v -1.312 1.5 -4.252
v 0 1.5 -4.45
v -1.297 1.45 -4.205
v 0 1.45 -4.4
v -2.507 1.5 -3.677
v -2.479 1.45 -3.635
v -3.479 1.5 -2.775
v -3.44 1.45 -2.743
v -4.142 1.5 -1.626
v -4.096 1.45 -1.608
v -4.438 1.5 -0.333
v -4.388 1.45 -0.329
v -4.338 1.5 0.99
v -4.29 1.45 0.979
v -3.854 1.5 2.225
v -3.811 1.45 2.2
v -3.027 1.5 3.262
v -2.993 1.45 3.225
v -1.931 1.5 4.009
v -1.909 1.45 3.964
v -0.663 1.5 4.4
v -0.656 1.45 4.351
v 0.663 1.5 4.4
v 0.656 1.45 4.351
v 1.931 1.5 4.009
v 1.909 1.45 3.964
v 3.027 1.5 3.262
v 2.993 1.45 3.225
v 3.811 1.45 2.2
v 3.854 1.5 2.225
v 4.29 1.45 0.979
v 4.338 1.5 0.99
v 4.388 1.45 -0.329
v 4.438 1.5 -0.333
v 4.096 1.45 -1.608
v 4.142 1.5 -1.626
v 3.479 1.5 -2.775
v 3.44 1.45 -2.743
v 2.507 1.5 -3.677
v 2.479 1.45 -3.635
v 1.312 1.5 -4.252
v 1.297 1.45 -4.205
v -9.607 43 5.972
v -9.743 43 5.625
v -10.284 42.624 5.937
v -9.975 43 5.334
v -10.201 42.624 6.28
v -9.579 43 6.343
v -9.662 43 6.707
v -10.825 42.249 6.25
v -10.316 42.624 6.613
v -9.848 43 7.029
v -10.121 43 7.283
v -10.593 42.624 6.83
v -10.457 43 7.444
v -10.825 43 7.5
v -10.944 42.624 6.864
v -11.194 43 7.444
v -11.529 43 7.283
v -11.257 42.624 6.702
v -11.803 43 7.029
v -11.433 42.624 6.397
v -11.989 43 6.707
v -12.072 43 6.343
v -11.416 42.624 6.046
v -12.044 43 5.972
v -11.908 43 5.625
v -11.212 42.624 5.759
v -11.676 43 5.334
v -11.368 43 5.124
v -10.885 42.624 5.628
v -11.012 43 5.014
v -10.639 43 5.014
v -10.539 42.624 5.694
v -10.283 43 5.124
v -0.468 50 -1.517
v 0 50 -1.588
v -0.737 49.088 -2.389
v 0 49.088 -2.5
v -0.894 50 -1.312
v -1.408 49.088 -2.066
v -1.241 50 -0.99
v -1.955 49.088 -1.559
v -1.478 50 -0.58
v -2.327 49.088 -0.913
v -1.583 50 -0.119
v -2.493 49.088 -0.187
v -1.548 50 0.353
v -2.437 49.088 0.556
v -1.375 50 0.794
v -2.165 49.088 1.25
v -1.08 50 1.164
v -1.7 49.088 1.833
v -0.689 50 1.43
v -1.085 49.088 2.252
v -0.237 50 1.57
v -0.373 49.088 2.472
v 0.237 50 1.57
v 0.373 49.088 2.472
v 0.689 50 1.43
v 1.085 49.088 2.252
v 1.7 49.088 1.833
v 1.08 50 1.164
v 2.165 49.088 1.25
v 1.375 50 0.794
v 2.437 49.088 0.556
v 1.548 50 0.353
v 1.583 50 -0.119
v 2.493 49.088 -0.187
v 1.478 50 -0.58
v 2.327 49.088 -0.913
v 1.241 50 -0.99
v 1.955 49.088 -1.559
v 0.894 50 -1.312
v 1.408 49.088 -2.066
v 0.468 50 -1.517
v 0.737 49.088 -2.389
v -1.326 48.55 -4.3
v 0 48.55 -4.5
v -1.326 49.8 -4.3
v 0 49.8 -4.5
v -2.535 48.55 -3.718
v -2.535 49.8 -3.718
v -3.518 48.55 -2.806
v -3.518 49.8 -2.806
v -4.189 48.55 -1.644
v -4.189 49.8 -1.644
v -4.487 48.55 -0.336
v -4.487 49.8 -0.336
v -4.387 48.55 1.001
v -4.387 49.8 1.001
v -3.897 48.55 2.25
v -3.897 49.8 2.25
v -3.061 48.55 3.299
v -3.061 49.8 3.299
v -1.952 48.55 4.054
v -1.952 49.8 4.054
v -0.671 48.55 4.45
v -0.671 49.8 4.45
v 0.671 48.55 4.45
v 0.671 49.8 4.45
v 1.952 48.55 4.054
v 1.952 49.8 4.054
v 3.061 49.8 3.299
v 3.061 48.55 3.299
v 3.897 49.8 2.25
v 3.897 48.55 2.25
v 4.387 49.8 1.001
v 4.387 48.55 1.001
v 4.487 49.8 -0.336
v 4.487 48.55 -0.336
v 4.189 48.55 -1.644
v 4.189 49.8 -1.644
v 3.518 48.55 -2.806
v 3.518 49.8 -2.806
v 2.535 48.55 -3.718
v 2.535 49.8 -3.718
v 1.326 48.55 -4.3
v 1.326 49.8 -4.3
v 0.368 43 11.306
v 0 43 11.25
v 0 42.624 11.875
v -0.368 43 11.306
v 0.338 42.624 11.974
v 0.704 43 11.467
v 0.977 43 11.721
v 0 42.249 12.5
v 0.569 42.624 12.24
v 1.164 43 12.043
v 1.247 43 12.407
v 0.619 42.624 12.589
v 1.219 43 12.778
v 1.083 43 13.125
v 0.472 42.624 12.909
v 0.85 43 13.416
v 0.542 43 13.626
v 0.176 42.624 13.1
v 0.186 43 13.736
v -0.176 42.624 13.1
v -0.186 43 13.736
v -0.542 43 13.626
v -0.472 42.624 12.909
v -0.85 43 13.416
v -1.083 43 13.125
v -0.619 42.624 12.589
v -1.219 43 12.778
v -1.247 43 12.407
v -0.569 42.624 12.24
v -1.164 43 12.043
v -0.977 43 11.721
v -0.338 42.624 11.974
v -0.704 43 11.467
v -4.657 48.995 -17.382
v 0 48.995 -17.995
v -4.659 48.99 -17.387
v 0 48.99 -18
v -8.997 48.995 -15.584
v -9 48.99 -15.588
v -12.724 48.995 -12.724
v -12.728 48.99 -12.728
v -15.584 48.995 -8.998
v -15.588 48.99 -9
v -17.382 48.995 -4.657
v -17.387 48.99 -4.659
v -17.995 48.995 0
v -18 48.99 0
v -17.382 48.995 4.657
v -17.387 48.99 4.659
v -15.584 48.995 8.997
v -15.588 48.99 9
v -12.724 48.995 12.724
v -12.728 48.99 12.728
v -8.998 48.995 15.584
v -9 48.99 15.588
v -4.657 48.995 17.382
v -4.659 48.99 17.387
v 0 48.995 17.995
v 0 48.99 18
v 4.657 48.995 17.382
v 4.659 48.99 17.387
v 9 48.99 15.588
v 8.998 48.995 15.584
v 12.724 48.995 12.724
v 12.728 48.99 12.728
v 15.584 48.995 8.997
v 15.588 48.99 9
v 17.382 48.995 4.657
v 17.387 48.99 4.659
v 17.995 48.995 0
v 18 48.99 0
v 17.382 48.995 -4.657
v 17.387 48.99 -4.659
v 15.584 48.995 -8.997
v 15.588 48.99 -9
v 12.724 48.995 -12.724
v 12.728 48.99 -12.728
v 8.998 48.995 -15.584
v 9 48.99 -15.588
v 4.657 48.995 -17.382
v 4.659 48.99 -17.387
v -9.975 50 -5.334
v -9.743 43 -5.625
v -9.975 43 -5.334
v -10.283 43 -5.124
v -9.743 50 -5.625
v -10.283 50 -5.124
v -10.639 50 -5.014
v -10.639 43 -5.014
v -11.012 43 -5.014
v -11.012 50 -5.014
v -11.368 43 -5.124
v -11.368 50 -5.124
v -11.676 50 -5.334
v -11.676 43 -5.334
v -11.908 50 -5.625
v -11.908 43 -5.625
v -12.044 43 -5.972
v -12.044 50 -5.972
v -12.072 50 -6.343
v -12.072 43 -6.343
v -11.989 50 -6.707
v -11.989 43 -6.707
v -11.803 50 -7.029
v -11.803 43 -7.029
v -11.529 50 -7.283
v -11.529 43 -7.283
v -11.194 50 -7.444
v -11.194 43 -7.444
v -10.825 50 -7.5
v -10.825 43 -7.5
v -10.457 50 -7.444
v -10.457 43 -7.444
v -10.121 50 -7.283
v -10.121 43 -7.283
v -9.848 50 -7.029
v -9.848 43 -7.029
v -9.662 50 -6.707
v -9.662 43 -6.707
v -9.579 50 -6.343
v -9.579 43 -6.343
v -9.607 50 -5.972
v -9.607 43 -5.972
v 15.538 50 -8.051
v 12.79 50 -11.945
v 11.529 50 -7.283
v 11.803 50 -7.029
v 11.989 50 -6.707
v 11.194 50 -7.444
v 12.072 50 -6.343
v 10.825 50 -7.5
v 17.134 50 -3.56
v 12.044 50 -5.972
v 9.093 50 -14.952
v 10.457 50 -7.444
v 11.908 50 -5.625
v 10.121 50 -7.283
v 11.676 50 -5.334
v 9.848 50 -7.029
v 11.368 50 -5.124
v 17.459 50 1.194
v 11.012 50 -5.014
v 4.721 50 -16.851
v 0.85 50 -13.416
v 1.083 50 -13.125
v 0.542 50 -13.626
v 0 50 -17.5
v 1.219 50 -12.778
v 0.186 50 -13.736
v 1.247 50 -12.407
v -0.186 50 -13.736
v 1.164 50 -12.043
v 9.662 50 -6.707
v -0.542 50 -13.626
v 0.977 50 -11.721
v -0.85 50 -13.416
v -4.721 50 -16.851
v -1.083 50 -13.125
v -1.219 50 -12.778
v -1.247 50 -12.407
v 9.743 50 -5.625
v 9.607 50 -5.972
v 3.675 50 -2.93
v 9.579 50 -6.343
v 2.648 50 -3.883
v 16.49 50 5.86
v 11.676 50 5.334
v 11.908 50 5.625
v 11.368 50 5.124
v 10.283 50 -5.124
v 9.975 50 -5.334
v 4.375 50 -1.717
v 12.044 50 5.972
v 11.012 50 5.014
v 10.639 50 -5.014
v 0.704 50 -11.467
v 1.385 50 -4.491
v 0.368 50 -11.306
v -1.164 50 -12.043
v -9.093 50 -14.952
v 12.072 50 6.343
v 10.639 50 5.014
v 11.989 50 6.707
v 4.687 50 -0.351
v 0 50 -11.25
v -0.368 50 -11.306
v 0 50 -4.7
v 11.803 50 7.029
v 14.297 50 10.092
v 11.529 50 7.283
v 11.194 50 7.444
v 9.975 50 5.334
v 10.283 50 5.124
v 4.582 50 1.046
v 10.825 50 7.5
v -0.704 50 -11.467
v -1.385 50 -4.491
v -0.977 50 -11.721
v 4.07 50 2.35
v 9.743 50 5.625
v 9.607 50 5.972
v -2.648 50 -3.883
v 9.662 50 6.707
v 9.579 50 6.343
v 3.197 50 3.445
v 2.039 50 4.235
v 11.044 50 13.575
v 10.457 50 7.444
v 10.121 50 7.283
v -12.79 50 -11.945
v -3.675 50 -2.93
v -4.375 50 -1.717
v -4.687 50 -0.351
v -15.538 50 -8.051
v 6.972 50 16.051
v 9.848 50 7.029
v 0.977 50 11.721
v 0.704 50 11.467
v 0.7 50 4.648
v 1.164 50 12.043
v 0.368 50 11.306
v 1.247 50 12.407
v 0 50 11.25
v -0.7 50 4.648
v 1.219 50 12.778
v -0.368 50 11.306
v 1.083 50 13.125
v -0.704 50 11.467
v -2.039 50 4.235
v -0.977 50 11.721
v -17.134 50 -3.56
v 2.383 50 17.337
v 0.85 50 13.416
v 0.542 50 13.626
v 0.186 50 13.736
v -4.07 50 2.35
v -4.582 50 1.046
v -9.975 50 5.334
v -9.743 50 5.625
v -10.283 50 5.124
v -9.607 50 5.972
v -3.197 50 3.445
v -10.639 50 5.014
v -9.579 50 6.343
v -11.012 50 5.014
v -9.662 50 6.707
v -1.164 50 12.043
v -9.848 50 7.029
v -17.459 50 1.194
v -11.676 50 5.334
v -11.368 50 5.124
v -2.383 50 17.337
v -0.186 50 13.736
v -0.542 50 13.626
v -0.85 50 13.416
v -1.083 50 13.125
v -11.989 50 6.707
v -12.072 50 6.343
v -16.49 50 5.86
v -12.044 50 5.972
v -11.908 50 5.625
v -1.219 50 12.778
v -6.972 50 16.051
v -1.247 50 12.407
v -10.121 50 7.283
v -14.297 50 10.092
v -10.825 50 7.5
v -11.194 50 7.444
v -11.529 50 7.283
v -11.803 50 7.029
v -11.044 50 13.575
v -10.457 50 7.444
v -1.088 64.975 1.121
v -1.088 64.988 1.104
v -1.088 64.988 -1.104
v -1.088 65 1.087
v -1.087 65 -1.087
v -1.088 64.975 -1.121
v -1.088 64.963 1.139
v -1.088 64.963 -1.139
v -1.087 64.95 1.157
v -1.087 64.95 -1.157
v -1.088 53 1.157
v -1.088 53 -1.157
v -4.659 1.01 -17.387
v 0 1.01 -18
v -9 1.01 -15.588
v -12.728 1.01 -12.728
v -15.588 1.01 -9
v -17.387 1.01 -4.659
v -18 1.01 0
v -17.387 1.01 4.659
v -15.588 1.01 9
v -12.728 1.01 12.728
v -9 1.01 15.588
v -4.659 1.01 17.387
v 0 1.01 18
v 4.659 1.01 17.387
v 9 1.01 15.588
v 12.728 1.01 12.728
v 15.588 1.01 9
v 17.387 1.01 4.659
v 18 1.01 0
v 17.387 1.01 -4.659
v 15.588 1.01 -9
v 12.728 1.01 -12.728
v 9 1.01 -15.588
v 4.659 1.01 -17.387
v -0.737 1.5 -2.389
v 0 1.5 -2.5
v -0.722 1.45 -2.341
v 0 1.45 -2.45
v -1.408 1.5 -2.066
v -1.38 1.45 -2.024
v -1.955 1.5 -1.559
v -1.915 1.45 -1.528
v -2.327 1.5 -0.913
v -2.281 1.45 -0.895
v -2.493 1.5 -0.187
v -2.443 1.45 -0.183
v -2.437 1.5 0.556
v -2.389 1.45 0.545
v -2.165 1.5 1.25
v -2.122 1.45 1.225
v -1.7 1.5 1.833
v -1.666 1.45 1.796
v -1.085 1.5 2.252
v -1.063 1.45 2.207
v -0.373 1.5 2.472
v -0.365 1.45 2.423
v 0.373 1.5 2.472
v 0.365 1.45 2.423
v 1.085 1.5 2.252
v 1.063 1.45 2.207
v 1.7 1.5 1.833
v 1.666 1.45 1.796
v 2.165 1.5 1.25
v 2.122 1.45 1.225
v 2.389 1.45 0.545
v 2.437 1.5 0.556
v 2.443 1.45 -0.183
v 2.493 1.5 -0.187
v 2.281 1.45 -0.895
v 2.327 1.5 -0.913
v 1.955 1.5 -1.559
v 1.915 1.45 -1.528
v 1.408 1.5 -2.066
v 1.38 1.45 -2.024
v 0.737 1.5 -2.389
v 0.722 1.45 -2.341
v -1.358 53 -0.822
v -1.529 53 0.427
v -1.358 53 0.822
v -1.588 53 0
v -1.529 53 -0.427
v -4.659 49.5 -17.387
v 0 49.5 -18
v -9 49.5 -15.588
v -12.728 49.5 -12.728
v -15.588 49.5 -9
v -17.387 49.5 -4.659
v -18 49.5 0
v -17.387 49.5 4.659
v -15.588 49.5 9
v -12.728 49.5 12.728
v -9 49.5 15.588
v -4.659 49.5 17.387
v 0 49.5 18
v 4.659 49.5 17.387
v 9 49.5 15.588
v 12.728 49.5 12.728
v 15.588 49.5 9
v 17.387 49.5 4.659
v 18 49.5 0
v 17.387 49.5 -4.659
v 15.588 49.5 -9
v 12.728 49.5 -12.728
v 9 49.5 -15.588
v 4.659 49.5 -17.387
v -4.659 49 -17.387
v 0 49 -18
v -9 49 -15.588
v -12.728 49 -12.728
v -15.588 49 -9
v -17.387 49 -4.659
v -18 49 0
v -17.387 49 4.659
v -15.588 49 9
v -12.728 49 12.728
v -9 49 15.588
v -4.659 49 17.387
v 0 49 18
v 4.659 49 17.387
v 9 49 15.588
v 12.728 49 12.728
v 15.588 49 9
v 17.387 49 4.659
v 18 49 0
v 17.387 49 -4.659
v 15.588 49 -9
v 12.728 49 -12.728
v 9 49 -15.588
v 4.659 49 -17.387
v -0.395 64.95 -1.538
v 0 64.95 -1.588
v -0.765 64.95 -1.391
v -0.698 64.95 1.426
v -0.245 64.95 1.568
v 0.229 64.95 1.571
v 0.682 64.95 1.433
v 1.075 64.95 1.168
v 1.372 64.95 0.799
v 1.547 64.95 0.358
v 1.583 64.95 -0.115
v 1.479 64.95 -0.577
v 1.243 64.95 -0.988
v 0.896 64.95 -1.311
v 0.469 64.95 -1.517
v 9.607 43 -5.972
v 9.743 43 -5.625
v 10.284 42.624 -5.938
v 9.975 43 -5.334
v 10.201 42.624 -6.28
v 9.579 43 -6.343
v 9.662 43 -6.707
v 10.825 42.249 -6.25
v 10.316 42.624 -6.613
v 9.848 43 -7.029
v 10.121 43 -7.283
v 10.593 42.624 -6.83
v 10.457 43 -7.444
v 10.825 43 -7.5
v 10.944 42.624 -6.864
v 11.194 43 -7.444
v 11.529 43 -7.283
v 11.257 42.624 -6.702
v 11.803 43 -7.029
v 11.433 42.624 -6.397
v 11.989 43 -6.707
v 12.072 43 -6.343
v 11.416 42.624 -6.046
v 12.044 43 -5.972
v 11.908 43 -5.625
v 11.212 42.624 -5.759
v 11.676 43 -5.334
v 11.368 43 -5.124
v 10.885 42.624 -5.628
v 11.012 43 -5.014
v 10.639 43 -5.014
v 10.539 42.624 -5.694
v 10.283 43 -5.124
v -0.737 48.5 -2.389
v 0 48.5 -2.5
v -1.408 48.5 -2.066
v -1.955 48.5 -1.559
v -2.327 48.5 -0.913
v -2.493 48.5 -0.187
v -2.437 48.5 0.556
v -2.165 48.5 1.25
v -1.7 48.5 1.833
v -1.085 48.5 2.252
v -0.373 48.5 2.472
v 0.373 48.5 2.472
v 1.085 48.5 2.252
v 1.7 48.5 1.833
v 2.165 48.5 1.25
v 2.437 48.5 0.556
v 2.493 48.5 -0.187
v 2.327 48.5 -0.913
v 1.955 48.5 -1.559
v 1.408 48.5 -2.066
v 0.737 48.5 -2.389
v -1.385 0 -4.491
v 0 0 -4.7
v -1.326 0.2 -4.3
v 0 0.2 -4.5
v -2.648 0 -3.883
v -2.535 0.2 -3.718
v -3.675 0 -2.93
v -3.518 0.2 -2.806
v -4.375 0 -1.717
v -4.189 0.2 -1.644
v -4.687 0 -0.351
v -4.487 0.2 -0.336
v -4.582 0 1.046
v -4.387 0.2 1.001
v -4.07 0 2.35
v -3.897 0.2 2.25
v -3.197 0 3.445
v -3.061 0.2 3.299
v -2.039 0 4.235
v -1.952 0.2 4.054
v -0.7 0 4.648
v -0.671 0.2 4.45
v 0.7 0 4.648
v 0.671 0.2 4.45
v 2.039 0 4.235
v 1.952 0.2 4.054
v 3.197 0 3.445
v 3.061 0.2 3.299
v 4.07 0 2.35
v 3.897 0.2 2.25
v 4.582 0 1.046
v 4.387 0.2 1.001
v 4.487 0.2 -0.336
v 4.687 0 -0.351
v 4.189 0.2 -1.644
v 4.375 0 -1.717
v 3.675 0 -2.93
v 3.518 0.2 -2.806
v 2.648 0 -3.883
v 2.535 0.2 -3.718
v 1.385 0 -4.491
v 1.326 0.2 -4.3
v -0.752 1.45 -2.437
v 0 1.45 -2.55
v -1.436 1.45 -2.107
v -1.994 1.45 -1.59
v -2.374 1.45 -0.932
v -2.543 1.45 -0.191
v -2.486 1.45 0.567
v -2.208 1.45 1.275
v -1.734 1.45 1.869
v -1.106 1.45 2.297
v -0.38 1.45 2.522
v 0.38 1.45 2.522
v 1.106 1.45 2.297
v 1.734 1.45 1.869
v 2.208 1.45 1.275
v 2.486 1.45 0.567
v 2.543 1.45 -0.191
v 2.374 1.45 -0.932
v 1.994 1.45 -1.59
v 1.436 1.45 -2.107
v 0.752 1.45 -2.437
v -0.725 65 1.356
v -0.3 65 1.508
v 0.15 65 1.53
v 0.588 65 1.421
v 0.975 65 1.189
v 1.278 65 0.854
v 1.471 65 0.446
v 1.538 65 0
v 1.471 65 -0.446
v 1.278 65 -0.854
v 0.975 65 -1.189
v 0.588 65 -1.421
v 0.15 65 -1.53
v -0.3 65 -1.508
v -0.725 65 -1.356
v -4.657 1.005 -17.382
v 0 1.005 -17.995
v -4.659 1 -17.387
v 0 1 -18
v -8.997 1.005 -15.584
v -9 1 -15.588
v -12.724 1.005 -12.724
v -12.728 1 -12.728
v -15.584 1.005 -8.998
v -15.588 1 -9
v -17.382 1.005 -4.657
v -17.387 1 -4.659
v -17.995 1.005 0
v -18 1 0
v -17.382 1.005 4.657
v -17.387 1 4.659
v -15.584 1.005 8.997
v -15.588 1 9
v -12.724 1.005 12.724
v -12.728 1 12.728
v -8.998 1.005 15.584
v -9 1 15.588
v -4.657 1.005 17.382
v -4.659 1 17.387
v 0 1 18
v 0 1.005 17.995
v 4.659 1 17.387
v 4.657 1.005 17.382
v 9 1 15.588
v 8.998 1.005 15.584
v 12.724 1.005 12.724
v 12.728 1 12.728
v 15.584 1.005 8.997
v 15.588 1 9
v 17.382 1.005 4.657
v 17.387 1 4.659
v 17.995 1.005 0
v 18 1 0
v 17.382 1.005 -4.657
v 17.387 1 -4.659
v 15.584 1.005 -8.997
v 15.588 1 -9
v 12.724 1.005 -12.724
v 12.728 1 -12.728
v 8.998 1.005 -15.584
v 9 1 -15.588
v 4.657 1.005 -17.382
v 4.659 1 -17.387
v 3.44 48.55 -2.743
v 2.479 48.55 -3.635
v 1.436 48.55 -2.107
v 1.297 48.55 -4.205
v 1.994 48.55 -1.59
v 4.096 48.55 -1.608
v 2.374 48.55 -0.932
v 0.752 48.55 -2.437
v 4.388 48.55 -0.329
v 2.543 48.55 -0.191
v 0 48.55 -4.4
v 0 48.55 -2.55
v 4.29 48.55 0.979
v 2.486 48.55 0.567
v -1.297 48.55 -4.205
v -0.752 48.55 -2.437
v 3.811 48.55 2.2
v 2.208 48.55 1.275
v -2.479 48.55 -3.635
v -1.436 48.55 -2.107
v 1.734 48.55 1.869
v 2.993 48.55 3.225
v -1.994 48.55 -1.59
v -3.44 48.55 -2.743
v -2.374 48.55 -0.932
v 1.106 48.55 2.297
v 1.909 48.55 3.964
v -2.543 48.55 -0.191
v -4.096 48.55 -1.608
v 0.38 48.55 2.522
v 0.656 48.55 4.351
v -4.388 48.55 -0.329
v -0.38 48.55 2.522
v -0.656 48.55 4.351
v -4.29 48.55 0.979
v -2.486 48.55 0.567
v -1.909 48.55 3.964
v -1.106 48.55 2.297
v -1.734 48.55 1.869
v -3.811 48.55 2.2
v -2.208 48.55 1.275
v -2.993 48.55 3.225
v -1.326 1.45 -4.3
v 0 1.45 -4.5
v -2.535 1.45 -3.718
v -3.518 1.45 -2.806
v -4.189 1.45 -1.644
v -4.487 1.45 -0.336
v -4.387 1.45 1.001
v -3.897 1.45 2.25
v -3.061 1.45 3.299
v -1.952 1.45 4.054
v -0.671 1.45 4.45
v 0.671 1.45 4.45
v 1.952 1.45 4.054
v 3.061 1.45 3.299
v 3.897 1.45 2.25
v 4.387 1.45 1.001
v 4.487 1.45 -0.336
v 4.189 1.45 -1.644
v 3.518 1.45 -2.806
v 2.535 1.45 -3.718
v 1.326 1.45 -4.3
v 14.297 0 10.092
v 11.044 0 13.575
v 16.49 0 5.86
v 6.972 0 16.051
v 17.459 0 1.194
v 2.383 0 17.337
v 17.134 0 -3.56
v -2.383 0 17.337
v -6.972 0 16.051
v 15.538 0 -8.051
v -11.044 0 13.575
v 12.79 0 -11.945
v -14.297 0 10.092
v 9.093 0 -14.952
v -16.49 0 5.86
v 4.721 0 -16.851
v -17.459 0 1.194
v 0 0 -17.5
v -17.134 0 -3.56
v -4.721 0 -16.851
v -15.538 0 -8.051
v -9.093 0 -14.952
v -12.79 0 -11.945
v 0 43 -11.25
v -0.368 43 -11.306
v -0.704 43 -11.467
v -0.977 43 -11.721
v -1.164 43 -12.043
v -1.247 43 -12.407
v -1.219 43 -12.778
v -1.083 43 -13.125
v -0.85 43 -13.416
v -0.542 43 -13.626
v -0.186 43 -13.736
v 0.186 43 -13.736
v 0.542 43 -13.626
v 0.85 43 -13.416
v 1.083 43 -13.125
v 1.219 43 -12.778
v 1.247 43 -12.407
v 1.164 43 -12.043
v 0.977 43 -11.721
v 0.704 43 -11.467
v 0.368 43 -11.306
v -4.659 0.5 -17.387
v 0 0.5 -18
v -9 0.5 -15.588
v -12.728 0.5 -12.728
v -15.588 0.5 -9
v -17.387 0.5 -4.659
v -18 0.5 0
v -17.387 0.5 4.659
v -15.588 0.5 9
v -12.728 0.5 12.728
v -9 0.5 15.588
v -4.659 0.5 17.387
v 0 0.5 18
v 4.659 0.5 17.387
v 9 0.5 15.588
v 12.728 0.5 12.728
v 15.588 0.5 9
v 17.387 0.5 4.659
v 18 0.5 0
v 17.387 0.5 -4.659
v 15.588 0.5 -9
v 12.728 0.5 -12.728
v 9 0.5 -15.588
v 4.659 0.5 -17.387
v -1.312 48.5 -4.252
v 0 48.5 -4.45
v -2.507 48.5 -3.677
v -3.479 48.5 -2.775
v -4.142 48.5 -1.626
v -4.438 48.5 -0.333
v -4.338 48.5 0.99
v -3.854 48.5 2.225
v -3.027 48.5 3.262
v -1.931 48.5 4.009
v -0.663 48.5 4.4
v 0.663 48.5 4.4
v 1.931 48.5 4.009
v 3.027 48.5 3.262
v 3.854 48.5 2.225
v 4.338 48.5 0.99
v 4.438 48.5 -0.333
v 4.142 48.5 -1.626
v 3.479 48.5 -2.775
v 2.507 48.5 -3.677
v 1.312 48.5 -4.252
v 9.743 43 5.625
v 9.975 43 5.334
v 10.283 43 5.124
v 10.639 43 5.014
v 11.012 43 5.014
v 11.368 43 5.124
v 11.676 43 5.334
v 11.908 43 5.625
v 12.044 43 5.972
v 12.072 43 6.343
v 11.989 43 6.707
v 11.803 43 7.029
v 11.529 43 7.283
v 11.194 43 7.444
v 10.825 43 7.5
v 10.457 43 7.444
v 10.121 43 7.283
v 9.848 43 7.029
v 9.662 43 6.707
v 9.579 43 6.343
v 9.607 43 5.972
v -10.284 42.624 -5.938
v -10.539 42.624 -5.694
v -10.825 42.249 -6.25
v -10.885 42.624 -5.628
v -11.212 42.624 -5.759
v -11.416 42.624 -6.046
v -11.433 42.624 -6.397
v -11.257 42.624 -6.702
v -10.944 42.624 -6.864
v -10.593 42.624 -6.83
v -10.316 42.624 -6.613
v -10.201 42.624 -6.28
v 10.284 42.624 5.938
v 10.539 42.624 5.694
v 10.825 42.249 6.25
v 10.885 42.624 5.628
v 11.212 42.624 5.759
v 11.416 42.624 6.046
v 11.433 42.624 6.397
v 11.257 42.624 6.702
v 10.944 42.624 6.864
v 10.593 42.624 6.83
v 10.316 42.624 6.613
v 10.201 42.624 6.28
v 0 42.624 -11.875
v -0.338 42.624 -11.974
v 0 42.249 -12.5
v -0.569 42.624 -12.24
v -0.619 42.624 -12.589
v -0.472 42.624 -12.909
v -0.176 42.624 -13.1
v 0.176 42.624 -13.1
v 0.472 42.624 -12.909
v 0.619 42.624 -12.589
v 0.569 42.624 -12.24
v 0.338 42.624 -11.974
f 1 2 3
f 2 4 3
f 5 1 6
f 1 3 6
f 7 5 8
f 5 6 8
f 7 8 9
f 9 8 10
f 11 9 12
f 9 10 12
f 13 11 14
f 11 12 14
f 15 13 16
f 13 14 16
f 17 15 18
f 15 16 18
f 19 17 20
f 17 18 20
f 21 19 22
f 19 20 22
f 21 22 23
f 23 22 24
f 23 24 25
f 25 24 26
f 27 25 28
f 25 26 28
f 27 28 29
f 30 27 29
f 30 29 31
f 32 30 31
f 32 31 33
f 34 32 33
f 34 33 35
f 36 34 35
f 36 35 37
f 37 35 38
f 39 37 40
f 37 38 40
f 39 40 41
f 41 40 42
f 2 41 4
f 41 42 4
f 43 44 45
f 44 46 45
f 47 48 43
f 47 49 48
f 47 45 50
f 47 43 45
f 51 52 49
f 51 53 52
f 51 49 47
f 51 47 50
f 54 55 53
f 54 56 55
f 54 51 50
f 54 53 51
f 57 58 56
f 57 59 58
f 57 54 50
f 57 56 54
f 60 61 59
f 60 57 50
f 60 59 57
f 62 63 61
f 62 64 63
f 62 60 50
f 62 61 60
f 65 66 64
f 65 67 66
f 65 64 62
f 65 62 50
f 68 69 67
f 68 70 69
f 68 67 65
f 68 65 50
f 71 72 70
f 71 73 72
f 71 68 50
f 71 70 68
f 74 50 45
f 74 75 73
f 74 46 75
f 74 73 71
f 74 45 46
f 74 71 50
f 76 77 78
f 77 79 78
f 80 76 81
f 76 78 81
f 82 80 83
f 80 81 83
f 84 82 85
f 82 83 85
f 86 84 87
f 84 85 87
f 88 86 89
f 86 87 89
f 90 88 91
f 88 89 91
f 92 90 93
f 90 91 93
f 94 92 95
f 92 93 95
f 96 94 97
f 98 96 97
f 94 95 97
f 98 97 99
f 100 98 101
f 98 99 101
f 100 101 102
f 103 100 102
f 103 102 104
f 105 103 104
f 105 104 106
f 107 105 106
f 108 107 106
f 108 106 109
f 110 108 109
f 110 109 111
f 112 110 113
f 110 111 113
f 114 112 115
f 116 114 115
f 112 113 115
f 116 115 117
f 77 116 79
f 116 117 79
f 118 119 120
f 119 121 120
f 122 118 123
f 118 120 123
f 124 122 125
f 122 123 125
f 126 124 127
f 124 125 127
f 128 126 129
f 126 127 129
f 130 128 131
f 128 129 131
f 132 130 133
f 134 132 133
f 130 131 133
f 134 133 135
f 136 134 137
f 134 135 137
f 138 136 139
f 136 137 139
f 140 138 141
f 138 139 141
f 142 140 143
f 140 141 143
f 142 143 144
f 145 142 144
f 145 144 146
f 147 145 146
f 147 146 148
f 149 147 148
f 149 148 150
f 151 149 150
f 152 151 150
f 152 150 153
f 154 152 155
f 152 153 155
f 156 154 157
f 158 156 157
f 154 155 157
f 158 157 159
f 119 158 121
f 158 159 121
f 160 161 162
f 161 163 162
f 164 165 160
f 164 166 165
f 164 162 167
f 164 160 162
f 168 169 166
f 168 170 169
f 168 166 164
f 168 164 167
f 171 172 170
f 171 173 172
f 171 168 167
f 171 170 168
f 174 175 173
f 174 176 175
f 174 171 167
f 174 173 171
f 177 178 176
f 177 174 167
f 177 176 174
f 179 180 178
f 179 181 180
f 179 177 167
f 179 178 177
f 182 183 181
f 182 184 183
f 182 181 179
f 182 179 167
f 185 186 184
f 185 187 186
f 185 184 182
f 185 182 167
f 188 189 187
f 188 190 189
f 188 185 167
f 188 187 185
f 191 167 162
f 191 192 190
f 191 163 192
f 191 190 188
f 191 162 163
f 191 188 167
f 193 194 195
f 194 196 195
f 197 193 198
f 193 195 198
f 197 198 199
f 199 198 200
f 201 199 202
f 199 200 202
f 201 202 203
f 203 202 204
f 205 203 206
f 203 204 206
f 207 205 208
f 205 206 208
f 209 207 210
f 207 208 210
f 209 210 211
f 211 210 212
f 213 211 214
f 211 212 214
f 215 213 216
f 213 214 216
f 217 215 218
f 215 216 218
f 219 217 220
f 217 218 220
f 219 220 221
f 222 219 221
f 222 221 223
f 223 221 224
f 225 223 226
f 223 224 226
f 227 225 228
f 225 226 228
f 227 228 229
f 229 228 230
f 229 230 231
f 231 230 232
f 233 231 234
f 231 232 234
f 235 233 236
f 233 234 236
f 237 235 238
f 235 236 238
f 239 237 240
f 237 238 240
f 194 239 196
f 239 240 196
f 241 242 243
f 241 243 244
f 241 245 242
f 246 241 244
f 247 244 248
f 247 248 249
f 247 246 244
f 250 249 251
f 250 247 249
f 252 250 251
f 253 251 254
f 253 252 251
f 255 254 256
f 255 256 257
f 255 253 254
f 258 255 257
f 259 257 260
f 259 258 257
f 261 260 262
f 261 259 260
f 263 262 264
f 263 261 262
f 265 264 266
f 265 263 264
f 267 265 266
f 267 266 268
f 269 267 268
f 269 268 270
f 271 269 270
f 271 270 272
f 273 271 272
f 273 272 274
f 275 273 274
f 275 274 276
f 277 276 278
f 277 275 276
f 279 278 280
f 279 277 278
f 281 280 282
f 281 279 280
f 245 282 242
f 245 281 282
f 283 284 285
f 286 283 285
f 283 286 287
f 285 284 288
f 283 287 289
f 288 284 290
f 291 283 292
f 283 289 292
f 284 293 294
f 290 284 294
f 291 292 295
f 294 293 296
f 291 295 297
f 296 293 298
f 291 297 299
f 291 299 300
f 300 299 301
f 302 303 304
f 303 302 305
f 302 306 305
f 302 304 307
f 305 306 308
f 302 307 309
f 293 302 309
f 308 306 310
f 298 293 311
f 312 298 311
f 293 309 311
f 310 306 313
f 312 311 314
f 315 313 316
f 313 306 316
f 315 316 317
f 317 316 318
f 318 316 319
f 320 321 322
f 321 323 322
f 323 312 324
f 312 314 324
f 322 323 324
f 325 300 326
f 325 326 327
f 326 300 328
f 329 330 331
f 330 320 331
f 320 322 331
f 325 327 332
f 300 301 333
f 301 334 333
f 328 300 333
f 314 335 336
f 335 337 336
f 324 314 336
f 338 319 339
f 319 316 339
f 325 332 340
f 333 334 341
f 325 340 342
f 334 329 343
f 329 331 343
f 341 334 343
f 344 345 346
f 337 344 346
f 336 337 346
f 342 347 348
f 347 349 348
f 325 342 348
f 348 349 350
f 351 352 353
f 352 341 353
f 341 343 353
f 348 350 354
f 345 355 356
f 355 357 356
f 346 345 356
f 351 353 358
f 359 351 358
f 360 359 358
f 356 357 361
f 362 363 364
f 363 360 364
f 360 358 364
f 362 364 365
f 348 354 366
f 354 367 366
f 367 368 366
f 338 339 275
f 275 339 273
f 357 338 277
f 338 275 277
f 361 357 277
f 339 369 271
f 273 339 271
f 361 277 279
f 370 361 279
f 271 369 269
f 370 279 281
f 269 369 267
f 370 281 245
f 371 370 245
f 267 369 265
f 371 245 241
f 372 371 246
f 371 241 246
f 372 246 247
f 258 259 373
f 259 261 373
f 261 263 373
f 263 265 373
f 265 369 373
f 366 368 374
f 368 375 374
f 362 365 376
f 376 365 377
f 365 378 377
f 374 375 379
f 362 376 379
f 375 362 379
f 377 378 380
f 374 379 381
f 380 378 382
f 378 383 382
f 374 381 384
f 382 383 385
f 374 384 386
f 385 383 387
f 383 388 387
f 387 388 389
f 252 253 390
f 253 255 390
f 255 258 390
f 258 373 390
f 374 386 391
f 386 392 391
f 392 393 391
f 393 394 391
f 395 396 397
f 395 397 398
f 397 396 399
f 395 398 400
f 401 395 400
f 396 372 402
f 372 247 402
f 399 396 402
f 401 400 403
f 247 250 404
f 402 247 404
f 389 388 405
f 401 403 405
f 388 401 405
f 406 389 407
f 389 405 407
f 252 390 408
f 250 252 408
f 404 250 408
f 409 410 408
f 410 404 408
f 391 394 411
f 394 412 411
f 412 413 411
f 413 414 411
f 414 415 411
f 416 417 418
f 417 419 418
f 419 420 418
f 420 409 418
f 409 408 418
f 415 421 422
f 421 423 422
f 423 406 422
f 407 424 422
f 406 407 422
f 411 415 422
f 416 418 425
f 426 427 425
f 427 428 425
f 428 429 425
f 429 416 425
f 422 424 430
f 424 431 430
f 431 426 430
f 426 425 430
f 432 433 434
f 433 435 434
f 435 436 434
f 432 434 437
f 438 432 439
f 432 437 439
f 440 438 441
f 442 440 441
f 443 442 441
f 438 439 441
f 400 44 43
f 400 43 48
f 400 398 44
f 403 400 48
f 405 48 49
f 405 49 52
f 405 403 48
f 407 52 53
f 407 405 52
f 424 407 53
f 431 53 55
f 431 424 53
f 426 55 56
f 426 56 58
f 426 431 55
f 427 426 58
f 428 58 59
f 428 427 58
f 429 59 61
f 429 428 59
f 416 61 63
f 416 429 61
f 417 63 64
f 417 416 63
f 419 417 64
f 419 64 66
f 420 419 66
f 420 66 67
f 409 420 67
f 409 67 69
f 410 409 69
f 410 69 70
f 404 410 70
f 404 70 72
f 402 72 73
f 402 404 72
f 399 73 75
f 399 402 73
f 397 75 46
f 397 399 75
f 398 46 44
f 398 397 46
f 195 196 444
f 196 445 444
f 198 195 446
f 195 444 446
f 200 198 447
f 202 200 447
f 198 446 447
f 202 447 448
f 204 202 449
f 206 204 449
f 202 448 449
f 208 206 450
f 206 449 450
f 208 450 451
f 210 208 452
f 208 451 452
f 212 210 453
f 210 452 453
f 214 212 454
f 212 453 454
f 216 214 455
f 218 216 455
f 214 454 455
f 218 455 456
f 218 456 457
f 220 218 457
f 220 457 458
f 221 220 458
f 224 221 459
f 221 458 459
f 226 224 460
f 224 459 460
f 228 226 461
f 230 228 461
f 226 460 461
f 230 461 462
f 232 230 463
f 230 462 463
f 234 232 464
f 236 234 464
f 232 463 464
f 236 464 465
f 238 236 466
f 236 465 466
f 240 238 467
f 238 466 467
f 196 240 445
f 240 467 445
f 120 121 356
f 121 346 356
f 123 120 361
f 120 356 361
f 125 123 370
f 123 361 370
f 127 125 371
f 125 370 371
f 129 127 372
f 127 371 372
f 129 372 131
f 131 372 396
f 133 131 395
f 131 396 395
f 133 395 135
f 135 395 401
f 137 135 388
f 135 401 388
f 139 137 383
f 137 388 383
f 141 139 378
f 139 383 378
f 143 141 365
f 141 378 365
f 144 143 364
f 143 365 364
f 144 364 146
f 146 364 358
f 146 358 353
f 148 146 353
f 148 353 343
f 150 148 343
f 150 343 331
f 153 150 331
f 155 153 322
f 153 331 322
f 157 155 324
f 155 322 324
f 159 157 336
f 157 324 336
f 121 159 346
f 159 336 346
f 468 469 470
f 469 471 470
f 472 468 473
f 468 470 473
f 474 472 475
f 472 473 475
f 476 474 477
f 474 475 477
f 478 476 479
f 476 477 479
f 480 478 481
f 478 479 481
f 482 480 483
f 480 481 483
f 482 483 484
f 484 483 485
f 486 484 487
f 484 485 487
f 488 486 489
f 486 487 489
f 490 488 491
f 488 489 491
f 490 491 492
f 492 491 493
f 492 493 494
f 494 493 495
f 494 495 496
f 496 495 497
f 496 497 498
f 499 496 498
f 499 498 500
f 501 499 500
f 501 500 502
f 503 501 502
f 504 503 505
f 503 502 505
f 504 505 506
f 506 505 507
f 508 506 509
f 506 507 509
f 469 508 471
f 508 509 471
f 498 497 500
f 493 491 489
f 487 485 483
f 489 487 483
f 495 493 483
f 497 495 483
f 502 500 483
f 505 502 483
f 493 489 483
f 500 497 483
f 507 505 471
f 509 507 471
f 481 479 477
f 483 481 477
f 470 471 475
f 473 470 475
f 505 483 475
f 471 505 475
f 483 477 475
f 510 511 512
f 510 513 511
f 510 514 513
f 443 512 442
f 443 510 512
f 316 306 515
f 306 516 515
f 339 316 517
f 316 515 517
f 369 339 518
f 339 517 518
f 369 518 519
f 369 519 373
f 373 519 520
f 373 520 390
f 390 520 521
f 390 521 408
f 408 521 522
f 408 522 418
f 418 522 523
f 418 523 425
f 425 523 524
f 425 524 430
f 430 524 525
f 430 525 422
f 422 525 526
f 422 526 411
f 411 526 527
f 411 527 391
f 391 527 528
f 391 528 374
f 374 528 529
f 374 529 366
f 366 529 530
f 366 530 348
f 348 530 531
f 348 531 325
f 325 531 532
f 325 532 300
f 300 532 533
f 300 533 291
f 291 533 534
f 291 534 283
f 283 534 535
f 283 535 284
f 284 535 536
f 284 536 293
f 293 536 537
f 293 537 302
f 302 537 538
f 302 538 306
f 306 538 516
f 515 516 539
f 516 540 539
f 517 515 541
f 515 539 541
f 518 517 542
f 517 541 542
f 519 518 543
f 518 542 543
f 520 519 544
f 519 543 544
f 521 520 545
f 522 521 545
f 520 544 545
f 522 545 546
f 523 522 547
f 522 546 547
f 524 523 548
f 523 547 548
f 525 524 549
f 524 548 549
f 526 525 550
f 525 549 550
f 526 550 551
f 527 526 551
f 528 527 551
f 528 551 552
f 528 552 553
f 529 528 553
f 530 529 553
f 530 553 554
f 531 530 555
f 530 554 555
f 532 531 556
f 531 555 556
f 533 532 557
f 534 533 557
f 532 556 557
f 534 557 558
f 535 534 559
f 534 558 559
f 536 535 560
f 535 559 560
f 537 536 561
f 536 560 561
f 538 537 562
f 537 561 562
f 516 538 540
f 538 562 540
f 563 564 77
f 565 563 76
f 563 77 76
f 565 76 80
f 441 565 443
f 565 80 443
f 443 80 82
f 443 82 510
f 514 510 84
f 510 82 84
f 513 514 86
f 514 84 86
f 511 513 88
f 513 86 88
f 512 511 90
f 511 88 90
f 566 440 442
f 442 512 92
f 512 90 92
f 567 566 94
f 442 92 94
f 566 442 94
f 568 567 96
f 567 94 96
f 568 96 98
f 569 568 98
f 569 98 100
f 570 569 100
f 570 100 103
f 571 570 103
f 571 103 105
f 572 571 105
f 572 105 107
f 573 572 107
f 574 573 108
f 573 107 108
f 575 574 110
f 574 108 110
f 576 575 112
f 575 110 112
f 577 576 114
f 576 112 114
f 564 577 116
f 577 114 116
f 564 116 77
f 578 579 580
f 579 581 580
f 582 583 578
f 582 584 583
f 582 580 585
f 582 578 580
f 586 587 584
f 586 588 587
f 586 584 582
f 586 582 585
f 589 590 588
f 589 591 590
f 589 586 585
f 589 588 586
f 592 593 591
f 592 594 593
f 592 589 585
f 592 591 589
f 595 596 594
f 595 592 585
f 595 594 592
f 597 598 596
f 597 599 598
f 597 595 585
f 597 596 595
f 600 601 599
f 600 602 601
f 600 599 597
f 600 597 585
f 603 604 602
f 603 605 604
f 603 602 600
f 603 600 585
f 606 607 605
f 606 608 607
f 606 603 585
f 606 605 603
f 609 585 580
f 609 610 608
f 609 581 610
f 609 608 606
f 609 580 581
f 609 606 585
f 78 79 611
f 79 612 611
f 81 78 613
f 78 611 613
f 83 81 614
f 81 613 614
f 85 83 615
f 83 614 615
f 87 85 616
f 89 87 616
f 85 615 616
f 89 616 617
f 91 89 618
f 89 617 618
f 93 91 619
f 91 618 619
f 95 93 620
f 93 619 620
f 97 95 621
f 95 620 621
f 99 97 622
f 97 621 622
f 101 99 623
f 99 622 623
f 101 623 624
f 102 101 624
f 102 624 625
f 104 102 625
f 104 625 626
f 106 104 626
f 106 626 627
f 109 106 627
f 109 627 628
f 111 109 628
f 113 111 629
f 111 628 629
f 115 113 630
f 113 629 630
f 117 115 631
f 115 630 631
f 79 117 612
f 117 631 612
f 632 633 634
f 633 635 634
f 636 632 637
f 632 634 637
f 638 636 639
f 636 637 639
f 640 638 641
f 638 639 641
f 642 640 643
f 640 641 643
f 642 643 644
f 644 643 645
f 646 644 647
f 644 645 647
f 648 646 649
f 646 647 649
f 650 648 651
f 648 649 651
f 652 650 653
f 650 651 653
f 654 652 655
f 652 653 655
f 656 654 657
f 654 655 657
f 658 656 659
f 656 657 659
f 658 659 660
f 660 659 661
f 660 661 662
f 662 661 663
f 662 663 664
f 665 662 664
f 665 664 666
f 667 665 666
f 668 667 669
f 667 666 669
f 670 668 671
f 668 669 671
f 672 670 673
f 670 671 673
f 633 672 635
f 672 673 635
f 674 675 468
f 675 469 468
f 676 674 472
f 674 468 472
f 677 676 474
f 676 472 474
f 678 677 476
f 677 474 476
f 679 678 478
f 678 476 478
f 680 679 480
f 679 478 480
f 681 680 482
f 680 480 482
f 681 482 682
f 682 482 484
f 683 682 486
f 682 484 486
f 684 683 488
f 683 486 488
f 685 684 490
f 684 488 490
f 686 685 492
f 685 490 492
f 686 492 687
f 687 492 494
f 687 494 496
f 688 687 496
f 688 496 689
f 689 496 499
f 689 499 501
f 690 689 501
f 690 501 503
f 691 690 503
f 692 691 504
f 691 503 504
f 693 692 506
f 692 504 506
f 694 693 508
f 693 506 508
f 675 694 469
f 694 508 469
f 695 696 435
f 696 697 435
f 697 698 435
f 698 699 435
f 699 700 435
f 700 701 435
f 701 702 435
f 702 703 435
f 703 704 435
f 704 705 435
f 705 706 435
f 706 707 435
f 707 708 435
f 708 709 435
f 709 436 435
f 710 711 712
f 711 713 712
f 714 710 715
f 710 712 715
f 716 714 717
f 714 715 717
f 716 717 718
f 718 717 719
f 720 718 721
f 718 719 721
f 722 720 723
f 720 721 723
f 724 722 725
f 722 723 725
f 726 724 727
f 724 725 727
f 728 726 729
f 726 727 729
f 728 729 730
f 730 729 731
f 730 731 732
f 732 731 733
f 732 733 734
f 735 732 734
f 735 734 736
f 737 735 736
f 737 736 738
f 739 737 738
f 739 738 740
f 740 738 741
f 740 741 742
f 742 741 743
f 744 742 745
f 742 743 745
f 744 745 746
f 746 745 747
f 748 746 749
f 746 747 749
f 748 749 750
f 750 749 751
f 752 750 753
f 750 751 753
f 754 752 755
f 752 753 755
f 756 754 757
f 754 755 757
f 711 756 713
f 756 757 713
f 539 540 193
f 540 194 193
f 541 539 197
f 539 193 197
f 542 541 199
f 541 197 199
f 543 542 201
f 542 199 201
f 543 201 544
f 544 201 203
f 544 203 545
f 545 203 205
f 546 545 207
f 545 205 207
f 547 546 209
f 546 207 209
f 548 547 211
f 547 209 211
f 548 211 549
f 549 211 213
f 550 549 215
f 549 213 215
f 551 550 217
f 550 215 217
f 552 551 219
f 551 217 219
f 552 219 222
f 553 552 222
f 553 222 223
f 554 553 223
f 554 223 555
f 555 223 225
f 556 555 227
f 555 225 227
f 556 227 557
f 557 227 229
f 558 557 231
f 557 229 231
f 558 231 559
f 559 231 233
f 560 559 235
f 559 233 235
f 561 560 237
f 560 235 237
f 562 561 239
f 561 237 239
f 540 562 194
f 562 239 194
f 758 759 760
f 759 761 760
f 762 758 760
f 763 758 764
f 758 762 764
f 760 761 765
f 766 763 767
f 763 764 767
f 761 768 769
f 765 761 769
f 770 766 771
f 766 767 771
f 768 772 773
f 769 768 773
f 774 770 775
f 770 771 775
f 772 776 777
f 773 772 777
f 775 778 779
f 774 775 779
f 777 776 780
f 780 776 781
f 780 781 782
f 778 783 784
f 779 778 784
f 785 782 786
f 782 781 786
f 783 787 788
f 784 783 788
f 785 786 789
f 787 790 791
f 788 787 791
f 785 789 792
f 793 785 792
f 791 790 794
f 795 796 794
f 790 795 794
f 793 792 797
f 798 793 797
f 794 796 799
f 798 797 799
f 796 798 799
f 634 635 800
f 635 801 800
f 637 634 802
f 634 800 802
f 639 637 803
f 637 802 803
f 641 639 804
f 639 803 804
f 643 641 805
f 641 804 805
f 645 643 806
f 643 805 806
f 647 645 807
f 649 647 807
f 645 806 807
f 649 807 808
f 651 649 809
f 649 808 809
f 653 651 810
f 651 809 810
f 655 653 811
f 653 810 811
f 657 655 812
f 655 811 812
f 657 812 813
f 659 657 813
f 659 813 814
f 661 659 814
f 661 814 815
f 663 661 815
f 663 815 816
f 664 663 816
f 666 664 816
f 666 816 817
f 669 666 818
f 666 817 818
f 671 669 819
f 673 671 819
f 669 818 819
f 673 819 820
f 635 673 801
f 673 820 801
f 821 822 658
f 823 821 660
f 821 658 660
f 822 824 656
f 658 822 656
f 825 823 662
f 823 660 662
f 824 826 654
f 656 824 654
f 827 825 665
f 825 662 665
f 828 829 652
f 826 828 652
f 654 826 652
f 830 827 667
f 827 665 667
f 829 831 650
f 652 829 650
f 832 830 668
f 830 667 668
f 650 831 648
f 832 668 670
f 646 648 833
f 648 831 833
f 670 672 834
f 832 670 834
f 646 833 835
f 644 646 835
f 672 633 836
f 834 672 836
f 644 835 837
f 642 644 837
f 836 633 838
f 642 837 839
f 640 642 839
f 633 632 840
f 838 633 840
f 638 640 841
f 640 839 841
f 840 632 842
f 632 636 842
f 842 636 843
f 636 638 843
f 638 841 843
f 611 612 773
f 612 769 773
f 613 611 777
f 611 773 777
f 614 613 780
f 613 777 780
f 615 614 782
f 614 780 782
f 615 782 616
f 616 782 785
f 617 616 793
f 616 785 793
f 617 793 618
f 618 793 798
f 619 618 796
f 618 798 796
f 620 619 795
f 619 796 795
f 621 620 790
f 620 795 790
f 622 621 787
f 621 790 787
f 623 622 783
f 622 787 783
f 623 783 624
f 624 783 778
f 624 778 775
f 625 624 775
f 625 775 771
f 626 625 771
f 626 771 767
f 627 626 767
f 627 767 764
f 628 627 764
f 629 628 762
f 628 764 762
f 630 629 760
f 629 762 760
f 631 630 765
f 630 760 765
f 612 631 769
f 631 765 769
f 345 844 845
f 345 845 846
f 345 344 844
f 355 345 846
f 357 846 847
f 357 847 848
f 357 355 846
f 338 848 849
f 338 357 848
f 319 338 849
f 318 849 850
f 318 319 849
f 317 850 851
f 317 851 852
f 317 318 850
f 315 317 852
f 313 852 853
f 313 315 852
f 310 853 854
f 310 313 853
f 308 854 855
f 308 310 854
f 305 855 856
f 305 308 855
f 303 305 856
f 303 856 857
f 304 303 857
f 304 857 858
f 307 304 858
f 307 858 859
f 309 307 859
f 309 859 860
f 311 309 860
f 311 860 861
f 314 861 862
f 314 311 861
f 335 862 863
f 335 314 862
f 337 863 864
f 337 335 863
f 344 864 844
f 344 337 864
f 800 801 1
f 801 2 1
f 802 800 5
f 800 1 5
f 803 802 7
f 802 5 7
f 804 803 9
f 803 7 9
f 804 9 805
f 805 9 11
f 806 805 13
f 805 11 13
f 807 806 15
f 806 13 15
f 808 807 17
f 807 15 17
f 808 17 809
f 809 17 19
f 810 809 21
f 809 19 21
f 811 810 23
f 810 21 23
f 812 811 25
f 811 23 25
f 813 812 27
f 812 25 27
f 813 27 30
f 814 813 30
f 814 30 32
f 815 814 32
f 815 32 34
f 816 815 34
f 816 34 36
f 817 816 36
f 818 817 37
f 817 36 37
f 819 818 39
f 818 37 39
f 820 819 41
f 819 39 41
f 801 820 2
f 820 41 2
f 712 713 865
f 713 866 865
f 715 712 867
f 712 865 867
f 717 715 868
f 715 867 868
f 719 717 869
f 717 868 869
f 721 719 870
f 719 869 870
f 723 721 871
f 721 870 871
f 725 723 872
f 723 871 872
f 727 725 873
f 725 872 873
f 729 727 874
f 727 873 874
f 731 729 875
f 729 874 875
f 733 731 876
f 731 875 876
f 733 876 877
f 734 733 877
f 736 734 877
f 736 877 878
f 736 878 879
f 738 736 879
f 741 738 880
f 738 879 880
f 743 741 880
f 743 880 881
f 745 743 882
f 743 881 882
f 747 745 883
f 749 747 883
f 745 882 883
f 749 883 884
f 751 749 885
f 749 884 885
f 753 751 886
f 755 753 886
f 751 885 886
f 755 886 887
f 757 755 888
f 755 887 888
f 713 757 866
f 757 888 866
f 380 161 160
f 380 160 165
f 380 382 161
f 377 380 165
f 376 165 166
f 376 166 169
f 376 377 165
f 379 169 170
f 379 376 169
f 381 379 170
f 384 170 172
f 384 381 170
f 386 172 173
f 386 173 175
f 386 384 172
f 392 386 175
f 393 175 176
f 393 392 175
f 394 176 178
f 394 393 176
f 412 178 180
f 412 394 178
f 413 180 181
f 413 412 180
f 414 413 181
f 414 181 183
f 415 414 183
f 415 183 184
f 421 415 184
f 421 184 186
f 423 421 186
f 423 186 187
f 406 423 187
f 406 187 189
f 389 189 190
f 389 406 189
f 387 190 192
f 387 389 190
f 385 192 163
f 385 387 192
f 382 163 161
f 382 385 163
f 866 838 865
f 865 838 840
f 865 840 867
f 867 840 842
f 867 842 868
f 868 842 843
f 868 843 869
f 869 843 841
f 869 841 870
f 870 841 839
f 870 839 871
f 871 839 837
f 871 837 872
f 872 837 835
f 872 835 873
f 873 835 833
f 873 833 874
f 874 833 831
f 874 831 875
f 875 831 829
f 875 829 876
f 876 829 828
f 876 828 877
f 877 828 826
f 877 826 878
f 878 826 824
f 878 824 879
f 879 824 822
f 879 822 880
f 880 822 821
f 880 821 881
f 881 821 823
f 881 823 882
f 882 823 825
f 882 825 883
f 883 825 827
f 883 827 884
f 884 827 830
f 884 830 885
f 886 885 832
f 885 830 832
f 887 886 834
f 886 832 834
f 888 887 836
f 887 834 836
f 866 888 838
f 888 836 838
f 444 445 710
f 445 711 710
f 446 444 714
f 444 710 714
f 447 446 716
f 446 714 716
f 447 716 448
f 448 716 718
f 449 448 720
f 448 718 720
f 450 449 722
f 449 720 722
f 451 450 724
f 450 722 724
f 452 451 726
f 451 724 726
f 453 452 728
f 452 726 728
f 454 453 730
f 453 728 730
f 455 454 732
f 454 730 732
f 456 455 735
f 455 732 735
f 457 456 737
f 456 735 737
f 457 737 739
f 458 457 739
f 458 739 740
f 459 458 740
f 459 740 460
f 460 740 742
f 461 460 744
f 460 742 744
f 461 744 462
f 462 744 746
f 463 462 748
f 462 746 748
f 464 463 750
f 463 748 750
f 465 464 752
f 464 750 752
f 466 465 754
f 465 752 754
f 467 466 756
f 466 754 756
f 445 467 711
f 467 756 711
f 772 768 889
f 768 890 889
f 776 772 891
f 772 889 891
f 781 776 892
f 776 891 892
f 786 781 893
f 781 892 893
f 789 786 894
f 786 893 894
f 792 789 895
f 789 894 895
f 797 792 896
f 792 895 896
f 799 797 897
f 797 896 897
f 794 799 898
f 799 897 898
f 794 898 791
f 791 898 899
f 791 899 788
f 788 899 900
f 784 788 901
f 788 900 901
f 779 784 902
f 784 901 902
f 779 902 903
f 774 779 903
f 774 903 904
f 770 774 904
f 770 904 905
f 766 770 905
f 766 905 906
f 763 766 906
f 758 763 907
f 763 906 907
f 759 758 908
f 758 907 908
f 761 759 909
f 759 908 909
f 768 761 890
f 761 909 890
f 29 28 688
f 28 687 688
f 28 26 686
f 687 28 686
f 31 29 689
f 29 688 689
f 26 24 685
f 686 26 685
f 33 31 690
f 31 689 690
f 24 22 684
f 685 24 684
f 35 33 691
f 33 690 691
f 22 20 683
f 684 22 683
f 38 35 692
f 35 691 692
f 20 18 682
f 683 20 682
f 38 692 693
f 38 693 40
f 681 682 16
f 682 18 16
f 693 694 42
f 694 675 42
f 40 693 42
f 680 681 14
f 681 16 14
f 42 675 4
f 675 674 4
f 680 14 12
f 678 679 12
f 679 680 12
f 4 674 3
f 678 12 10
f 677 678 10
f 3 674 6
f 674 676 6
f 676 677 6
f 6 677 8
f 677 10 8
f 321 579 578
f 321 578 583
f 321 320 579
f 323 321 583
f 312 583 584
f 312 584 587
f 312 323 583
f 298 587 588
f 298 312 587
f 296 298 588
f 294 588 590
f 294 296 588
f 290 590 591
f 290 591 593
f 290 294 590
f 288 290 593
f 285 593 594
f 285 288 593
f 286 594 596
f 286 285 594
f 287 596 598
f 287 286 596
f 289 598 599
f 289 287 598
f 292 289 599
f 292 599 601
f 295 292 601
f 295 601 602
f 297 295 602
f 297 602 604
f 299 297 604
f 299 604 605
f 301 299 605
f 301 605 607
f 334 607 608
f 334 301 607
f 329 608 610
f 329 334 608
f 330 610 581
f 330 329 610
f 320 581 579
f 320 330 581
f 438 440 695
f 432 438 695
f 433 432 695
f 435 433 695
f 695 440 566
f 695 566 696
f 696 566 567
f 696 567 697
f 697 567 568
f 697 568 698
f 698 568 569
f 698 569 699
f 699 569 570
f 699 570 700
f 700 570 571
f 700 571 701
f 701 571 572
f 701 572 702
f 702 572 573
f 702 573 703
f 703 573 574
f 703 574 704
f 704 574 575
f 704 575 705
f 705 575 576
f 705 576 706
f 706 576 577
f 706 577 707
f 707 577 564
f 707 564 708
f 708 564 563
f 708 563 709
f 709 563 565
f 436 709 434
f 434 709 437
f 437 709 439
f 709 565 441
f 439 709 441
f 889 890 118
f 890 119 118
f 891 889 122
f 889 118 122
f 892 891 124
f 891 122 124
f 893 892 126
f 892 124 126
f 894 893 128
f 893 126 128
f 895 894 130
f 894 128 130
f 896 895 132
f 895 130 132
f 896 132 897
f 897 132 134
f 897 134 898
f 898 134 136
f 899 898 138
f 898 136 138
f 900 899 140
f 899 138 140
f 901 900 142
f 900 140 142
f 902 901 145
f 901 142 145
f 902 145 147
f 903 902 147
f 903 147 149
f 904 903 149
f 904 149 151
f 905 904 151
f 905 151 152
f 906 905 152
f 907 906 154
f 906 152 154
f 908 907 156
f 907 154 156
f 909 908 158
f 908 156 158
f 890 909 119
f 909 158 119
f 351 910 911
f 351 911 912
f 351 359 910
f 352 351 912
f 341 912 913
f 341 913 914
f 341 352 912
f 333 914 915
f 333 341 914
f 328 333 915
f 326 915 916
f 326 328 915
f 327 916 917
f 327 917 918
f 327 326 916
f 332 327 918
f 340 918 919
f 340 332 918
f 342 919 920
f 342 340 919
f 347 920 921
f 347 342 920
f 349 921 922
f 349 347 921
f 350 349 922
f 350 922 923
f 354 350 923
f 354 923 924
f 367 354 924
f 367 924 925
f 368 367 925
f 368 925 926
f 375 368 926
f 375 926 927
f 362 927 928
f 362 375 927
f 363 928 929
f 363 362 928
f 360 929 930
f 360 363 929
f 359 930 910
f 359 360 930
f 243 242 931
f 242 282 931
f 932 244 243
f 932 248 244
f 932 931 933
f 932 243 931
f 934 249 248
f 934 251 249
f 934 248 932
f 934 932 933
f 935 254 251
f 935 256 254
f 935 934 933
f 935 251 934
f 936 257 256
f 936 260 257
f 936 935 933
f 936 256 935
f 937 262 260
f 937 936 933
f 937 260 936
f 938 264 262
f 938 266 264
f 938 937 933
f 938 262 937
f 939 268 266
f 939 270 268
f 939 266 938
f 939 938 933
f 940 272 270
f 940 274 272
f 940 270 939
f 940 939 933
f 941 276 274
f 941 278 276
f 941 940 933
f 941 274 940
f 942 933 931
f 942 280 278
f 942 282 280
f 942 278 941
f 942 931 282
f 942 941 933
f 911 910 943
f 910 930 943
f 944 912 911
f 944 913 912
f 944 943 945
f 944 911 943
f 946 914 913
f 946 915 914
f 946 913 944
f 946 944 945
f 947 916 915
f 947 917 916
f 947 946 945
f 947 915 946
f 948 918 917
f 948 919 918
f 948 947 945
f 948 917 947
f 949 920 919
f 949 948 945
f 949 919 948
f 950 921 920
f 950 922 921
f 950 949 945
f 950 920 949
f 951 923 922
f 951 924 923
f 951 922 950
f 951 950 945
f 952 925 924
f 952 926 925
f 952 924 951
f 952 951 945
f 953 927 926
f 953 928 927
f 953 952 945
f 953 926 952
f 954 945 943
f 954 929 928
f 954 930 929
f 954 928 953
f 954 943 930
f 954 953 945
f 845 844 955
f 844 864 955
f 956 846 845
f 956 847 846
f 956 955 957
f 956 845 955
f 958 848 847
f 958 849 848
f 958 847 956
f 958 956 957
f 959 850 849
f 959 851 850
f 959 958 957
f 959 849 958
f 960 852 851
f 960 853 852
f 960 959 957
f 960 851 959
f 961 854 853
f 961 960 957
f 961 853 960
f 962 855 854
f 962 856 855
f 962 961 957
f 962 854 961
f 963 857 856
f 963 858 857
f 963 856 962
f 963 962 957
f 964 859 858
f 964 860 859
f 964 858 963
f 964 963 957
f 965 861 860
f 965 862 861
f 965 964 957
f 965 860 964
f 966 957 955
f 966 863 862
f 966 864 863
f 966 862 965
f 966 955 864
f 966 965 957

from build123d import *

# Parameters (mm, degrees)
ESQUISSE2_W                  = 0.5
ESQUISSE2_H                  = 2.313006702
ENL_V_MAT_EXTRU_1_DEPTH      = 12
R_P_TITION_CIRCULAIRE1_COUNT = 6


with BuildPart() as part:
    # Esquisse1 → Révolution1 (revolve)
    with BuildSketch(Plane.XY, mode=Mode.PRIVATE) as r_volution1_sk:
        Polygon((0, 65), (-1.5375, 65), (-1.5875, 64.95), (-1.5875, 50), (-2.5, 49.0875), (-2.5, 48.5), (-2.55, 48.55), (-4.4, 48.55), (-4.45, 48.5), (-4.5, 48.55), (-4.5, 49.8), (-4.7, 50), (-17.5, 50), (-18, 49.5), (-18, 49), (-17.995, 48.995), (-18, 48.99), (-18, 1.01), (-17.995, 1.005), (-18, 1), (-18, 0.5), (-17.5, 0), (-4.7, 0), (-4.5, 0.2), (-4.5, 1.45), (-4.45, 1.5), (-4.4, 1.45), (-2.55, 1.45), (-2.5, 1.5), (-2.45, 1.45), (0, 1.45), align=None)
    revolve(r_volution1_sk.sketch.rotate(Axis((0, -4.92112906, 0), (0, 1, 0)), 270), axis=Axis((0, -4.92112906, 0), (0, 1, 0)))

    # Esquisse2 → Enlèv. mat.-Extru.1 (cut)
    with BuildSketch(Plane(origin=(0, 65, 0), x_dir=(1, 0, 0), z_dir=(0, 1, 0))):
        with Locations((-1.3375, 0)):
            Rectangle(ESQUISSE2_W, ESQUISSE2_H)
    extrude(amount=-ENL_V_MAT_EXTRU_1_DEPTH, mode=Mode.SUBTRACT)

    # Esquisse4 → Trou taraudé M31 (revolve, cut)
    with BuildSketch(Plane(origin=(0, 50, -12.5), x_dir=(0, 0, 1), z_dir=(1, 0, 0))):
        Polygon((0, 0), (0, 7.751075774), (1.25, 7), (1.25, 0), align=None)
    trou_taraud_m31 = revolve(axis=Axis((0, 56.35, -12.5), (0, -1, 0)), mode=Mode.SUBTRACT)

    # Répétition circulaire1: Trou taraudé M31 ×6 about axis
    r_p_tition_circulaire1_axis = Axis((0, 0, 0), (0, 1, 0))
    for i in range(1, R_P_TITION_CIRCULAIRE1_COUNT):
        add(trou_taraud_m31.rotate(r_p_tition_circulaire1_axis, i * 360 / R_P_TITION_CIRCULAIRE1_COUNT), mode=Mode.SUBTRACT)


solid = part.part
